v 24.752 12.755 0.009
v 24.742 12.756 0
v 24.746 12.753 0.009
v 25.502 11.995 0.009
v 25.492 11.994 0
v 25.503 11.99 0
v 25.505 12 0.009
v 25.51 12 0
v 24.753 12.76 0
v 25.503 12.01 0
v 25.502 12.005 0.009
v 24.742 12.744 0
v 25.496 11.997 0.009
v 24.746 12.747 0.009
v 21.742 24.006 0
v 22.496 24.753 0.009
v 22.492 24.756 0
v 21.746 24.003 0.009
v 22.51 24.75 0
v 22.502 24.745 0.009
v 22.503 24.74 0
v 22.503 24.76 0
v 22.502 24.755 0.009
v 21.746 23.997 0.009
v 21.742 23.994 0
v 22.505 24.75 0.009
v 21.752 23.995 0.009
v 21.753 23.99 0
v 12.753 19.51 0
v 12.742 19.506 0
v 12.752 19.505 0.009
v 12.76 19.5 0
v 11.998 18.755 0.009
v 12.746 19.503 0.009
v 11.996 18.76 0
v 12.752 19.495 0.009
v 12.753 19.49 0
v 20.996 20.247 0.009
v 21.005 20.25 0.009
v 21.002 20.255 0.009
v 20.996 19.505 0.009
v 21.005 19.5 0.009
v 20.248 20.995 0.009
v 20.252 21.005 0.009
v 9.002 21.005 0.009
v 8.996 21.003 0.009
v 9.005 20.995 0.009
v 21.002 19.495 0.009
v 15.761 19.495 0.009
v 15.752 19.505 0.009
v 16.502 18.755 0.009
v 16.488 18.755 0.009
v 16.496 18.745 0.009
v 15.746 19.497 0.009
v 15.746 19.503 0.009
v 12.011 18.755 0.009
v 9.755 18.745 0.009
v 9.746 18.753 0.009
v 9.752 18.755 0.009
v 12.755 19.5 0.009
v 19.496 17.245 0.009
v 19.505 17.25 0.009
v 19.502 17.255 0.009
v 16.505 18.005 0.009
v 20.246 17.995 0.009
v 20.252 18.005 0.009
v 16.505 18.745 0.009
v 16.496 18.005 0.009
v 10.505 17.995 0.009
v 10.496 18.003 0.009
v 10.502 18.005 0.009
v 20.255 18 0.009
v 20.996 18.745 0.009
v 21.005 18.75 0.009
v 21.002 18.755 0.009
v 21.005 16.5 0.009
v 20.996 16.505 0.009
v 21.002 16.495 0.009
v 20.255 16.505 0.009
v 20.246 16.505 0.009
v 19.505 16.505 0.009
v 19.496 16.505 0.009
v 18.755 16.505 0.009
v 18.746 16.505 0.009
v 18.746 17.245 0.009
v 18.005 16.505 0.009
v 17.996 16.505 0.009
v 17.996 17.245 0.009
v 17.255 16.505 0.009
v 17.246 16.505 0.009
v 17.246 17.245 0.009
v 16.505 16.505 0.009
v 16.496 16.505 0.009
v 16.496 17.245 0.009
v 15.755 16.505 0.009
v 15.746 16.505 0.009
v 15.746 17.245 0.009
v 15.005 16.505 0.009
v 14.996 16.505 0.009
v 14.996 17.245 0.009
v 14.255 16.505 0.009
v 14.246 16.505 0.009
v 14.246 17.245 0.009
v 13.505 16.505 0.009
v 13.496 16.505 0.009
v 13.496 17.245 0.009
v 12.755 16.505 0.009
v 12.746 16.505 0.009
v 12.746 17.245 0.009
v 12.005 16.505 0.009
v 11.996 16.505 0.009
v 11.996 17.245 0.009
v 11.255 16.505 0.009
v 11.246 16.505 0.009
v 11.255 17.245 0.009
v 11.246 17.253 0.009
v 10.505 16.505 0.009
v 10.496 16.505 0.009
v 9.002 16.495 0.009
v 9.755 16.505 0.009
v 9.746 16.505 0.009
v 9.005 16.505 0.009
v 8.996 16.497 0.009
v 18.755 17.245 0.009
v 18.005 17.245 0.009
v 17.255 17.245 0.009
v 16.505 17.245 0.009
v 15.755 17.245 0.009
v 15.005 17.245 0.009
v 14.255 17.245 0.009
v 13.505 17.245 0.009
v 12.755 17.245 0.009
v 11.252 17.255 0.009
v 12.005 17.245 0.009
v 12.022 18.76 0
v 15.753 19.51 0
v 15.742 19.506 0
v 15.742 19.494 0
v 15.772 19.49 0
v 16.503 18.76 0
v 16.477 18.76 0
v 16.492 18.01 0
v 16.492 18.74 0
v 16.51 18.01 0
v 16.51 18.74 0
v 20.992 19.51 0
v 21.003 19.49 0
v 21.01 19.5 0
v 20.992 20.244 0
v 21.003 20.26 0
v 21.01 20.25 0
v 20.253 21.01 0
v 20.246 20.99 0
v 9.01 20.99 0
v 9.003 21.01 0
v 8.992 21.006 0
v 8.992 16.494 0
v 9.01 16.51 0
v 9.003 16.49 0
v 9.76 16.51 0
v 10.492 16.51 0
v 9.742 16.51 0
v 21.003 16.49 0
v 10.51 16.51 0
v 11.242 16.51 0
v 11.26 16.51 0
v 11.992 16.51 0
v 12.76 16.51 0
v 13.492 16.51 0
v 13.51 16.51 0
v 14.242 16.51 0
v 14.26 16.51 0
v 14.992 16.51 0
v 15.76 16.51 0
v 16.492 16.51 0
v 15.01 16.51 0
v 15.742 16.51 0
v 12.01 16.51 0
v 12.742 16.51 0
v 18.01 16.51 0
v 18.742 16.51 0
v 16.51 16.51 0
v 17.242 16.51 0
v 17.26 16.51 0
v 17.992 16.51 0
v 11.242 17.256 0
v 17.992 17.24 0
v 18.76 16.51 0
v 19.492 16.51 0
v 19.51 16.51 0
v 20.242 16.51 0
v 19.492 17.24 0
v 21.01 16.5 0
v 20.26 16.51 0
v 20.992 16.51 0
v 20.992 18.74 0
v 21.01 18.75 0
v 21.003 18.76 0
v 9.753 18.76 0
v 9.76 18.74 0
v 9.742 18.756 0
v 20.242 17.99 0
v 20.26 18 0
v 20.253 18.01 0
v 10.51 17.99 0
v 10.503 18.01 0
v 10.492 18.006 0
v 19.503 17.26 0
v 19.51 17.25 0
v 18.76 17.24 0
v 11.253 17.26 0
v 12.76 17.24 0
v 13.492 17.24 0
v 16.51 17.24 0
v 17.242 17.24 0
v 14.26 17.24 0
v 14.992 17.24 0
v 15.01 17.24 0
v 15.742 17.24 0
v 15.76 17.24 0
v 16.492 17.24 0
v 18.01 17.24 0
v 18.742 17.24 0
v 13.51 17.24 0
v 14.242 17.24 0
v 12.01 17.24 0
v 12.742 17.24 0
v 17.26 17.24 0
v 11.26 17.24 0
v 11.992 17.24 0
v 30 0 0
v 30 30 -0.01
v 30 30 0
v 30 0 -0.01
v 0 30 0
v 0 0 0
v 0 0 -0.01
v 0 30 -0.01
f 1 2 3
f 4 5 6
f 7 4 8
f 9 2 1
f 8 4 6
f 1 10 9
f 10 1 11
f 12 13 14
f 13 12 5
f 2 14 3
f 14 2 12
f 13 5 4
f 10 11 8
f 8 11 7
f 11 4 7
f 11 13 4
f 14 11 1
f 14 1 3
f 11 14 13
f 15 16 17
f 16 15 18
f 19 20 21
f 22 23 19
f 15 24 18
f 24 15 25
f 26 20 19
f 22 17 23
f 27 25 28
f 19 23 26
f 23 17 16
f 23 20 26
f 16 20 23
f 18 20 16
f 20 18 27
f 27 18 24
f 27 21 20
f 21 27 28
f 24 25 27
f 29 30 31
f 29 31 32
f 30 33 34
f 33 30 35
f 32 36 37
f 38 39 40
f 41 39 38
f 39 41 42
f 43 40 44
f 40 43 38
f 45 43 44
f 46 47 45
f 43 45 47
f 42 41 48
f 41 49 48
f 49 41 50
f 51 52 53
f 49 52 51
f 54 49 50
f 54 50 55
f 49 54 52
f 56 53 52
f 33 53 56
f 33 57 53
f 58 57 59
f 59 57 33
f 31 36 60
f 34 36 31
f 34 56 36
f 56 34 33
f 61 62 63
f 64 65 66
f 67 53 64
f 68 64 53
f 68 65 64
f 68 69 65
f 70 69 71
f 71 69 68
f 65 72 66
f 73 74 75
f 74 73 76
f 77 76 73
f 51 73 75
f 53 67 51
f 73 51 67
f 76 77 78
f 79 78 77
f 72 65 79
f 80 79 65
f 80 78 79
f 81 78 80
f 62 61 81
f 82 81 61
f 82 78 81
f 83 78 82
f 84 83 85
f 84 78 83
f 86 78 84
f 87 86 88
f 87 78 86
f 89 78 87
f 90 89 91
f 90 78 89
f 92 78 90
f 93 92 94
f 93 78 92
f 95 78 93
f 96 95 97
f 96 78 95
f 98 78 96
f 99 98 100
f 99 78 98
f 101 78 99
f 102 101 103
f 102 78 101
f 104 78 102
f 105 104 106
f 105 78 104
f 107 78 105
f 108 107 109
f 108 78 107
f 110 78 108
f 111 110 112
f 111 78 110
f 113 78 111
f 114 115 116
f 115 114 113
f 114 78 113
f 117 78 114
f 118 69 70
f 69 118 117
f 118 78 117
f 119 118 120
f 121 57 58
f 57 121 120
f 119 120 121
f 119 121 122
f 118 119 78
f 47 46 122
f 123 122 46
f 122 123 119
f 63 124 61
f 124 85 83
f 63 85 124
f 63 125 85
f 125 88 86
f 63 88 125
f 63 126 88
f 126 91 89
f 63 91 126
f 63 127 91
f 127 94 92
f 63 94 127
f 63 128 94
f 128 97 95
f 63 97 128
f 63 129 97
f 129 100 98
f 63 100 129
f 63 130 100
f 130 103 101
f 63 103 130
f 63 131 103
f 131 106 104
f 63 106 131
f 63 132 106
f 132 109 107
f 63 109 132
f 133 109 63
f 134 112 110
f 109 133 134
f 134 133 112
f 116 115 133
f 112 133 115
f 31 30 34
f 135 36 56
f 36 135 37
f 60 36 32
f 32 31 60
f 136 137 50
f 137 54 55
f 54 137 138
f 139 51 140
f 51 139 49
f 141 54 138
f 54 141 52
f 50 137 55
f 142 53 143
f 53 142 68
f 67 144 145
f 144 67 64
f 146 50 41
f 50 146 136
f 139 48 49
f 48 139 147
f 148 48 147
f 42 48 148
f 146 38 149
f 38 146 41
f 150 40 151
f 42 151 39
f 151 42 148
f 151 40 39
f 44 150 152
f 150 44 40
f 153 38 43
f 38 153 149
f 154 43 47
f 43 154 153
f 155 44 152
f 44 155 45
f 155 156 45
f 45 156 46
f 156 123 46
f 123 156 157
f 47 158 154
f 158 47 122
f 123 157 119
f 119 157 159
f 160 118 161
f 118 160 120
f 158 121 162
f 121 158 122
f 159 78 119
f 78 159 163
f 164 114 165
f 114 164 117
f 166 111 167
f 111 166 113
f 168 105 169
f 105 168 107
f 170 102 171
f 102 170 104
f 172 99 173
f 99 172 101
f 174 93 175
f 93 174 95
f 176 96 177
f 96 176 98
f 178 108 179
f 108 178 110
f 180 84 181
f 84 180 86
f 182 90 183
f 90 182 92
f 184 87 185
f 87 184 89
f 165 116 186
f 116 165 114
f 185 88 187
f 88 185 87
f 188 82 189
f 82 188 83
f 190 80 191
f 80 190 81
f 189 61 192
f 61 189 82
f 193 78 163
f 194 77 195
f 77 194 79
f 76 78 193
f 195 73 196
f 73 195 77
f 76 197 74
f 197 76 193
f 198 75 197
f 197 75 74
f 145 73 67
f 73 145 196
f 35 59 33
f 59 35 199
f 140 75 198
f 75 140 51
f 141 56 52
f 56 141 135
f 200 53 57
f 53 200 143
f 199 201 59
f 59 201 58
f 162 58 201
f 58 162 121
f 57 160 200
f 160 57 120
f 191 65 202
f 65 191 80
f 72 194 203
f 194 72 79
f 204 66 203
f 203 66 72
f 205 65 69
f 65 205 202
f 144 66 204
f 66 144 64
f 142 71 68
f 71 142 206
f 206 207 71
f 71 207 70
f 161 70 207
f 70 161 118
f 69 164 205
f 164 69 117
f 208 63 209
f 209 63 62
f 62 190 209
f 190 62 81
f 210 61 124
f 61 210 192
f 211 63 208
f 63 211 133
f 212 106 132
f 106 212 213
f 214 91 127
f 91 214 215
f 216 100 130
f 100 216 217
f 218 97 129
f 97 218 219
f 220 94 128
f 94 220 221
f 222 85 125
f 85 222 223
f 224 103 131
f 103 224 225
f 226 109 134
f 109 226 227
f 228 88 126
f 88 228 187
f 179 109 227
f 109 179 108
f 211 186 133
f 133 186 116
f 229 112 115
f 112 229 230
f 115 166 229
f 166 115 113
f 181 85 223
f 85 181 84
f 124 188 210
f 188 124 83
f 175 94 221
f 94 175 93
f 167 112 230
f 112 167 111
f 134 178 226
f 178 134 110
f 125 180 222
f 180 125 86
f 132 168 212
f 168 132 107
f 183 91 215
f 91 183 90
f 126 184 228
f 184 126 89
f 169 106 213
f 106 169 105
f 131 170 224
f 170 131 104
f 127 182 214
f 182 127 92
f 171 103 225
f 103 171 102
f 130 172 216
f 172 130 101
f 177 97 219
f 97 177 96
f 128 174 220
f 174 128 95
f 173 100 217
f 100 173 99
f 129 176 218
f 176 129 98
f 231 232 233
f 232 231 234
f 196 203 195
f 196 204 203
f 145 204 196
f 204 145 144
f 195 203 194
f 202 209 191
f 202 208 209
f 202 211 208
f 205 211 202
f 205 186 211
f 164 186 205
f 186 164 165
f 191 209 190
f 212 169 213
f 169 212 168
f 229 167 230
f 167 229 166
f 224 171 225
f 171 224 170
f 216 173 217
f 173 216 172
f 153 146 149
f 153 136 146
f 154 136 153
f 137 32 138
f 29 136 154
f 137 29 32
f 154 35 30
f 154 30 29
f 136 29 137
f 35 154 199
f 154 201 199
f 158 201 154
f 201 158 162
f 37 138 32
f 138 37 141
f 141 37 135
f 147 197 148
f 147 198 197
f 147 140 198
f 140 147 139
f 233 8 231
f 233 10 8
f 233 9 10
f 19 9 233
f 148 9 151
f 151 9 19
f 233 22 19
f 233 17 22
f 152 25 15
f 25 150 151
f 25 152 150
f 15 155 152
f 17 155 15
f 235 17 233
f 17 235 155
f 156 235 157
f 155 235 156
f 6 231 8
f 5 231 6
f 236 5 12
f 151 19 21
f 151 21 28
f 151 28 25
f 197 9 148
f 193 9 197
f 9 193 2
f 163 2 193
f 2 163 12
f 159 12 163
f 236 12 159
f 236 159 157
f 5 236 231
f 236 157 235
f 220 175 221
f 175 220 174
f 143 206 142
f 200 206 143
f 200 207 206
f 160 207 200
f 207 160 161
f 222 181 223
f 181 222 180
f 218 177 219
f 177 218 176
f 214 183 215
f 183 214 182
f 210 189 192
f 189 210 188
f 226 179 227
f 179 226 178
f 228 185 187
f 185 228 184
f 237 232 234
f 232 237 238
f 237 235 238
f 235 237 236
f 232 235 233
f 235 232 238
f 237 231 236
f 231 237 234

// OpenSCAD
hull(){
    translate([25.5, 12]) sphere(0.01);
    translate([24.75, 12.75]) sphere(0.01);
}
hull(){
    translate([21.75, 24]) sphere(0.01);
    translate([22.5, 24.75]) sphere(0.01);
}
hull(){
    translate([12.75, 19.5]) sphere(0.01);
    translate([12, 18.75]) sphere(0.01);
}
hull(){
    translate([15.75, 19.5]) sphere(0.01);
    translate([16.5, 18.75]) sphere(0.01);
}
hull(){
    translate([16.5, 18.75]) sphere(0.01);
    translate([16.5, 18]) sphere(0.01);
}
hull(){
    translate([15.75, 19.5]) sphere(0.01);
    translate([16.5, 19.5]) sphere(0.01);
}
hull(){
    translate([16.5, 19.5]) sphere(0.01);
    translate([17.25, 19.5]) sphere(0.01);
}
hull(){
    translate([17.25, 19.5]) sphere(0.01);
    translate([18, 19.5]) sphere(0.01);
}
hull(){
    translate([18, 19.5]) sphere(0.01);
    translate([18.75, 19.5]) sphere(0.01);
}
hull(){
    translate([18.75, 19.5]) sphere(0.01);
    translate([19.5, 19.5]) sphere(0.01);
}
hull(){
    translate([19.5, 19.5]) sphere(0.01);
    translate([20.25, 19.5]) sphere(0.01);
}
hull(){
    translate([20.25, 19.5]) sphere(0.01);
    translate([21, 19.5]) sphere(0.01);
}
hull(){
    translate([21, 19.5]) sphere(0.01);
    translate([21, 20.25]) sphere(0.01);
}
hull(){
    translate([21, 20.25]) sphere(0.01);
    translate([20.25, 21]) sphere(0.01);
}
hull(){
    translate([20.25, 21]) sphere(0.01);
    translate([19.5, 21]) sphere(0.01);
}
hull(){
    translate([19.5, 21]) sphere(0.01);
    translate([18.75, 21]) sphere(0.01);
}
hull(){
    translate([18.75, 21]) sphere(0.01);
    translate([18, 21]) sphere(0.01);
}
hull(){
    translate([18, 21]) sphere(0.01);
    translate([17.25, 21]) sphere(0.01);
}
hull(){
    translate([17.25, 21]) sphere(0.01);
    translate([16.5, 21]) sphere(0.01);
}
hull(){
    translate([16.5, 21]) sphere(0.01);
    translate([15.75, 21]) sphere(0.01);
}
hull(){
    translate([15.75, 21]) sphere(0.01);
    translate([15, 21]) sphere(0.01);
}
hull(){
    translate([15, 21]) sphere(0.01);
    translate([14.25, 21]) sphere(0.01);
}
hull(){
    translate([14.25, 21]) sphere(0.01);
    translate([13.5, 21]) sphere(0.01);
}
hull(){
    translate([13.5, 21]) sphere(0.01);
    translate([12.75, 21]) sphere(0.01);
}
hull(){
    translate([12.75, 21]) sphere(0.01);
    translate([12, 21]) sphere(0.01);
}
hull(){
    translate([12, 21]) sphere(0.01);
    translate([11.25, 21]) sphere(0.01);
}
hull(){
    translate([11.25, 21]) sphere(0.01);
    translate([10.5, 21]) sphere(0.01);
}
hull(){
    translate([10.5, 21]) sphere(0.01);
    translate([9.75, 21]) sphere(0.01);
}
hull(){
    translate([9.75, 21]) sphere(0.01);
    translate([9, 21]) sphere(0.01);
}
hull(){
    translate([9, 21]) sphere(0.01);
    translate([9, 20.25]) sphere(0.01);
}
hull(){
    translate([9, 20.25]) sphere(0.01);
    translate([9, 19.5]) sphere(0.01);
}
hull(){
    translate([9, 19.5]) sphere(0.01);
    translate([9, 18.75]) sphere(0.01);
}
hull(){
    translate([9, 18.75]) sphere(0.01);
    translate([9, 18]) sphere(0.01);
}
hull(){
    translate([9, 18]) sphere(0.01);
    translate([9, 17.25]) sphere(0.01);
}
hull(){
    translate([9, 17.25]) sphere(0.01);
    translate([9, 16.5]) sphere(0.01);
}
hull(){
    translate([9, 16.5]) sphere(0.01);
    translate([9.75, 16.5]) sphere(0.01);
}
hull(){
    translate([9.75, 16.5]) sphere(0.01);
    translate([10.5, 16.5]) sphere(0.01);
}
hull(){
    translate([10.5, 16.5]) sphere(0.01);
    translate([11.25, 16.5]) sphere(0.01);
}
hull(){
    translate([11.25, 16.5]) sphere(0.01);
    translate([12, 16.5]) sphere(0.01);
}
hull(){
    translate([12, 16.5]) sphere(0.01);
    translate([12.75, 16.5]) sphere(0.01);
}
hull(){
    translate([12.75, 16.5]) sphere(0.01);
    translate([13.5, 16.5]) sphere(0.01);
}
hull(){
    translate([13.5, 16.5]) sphere(0.01);
    translate([14.25, 16.5]) sphere(0.01);
}
hull(){
    translate([14.25, 16.5]) sphere(0.01);
    translate([15, 16.5]) sphere(0.01);
}
hull(){
    translate([15, 16.5]) sphere(0.01);
    translate([15.75, 16.5]) sphere(0.01);
}
hull(){
    translate([15.75, 16.5]) sphere(0.01);
    translate([16.5, 16.5]) sphere(0.01);
}
hull(){
    translate([16.5, 16.5]) sphere(0.01);
    translate([17.25, 16.5]) sphere(0.01);
}
hull(){
    translate([17.25, 16.5]) sphere(0.01);
    translate([18, 16.5]) sphere(0.01);
}
hull(){
    translate([18, 16.5]) sphere(0.01);
    translate([18.75, 16.5]) sphere(0.01);
}
hull(){
    translate([18.75, 16.5]) sphere(0.01);
    translate([19.5, 16.5]) sphere(0.01);
}
hull(){
    translate([19.5, 16.5]) sphere(0.01);
    translate([20.25, 16.5]) sphere(0.01);
}
hull(){
    translate([20.25, 16.5]) sphere(0.01);
    translate([21, 16.5]) sphere(0.01);
}
hull(){
    translate([21, 16.5]) sphere(0.01);
    translate([21, 17.25]) sphere(0.01);
}
hull(){
    translate([21, 17.25]) sphere(0.01);
    translate([21, 18]) sphere(0.01);
}
hull(){
    translate([21, 18]) sphere(0.01);
    translate([21, 18.75]) sphere(0.01);
}
hull(){
    translate([21, 18.75]) sphere(0.01);
    translate([20.25, 18.75]) sphere(0.01);
}
hull(){
    translate([20.25, 18.75]) sphere(0.01);
    translate([19.5, 18.75]) sphere(0.01);
}
hull(){
    translate([19.5, 18.75]) sphere(0.01);
    translate([18.75, 18.75]) sphere(0.01);
}
hull(){
    translate([18.75, 18.75]) sphere(0.01);
    translate([18, 18.75]) sphere(0.01);
}
hull(){
    translate([18, 18.75]) sphere(0.01);
    translate([17.25, 18.75]) sphere(0.01);
}
hull(){
    translate([17.25, 18.75]) sphere(0.01);
    translate([16.5, 18.75]) sphere(0.01);
}
hull(){
    translate([16.5, 18.75]) sphere(0.01);
    translate([15.75, 18.75]) sphere(0.01);
}
hull(){
    translate([15.75, 18.75]) sphere(0.01);
    translate([15, 18.75]) sphere(0.01);
}
hull(){
    translate([15, 18.75]) sphere(0.01);
    translate([14.25, 18.75]) sphere(0.01);
}
hull(){
    translate([14.25, 18.75]) sphere(0.01);
    translate([13.5, 18.75]) sphere(0.01);
}
hull(){
    translate([13.5, 18.75]) sphere(0.01);
    translate([12.75, 18.75]) sphere(0.01);
}
hull(){
    translate([12.75, 18.75]) sphere(0.01);
    translate([12, 18.75]) sphere(0.01);
}
hull(){
    translate([12, 18.75]) sphere(0.01);
    translate([11.25, 18.75]) sphere(0.01);
}
hull(){
    translate([11.25, 18.75]) sphere(0.01);
    translate([10.5, 18.75]) sphere(0.01);
}
hull(){
    translate([10.5, 18.75]) sphere(0.01);
    translate([9.75, 18.75]) sphere(0.01);
}
hull(){
    translate([9.75, 18.75]) sphere(0.01);
    translate([9.75, 18]) sphere(0.01);
}
hull(){
    translate([9.75, 18]) sphere(0.01);
    translate([9.75, 17.25]) sphere(0.01);
}
hull(){
    translate([9.75, 17.25]) sphere(0.01);
    translate([9.75, 16.5]) sphere(0.01);
}
hull(){
    translate([9.75, 16.5]) sphere(0.01);
    translate([10.5, 16.5]) sphere(0.01);
}
hull(){
    translate([10.5, 16.5]) sphere(0.01);
    translate([11.25, 16.5]) sphere(0.01);
}
hull(){
    translate([11.25, 16.5]) sphere(0.01);
    translate([12, 16.5]) sphere(0.01);
}
hull(){
    translate([12, 16.5]) sphere(0.01);
    translate([12.75, 16.5]) sphere(0.01);
}
hull(){
    translate([12.75, 16.5]) sphere(0.01);
    translate([13.5, 16.5]) sphere(0.01);
}
hull(){
    translate([13.5, 16.5]) sphere(0.01);
    translate([14.25, 16.5]) sphere(0.01);
}
hull(){
    translate([14.25, 16.5]) sphere(0.01);
    translate([15, 16.5]) sphere(0.01);
}
hull(){
    translate([15, 16.5]) sphere(0.01);
    translate([15.75, 16.5]) sphere(0.01);
}
hull(){
    translate([15.75, 16.5]) sphere(0.01);
    translate([16.5, 16.5]) sphere(0.01);
}
hull(){
    translate([16.5, 16.5]) sphere(0.01);
    translate([17.25, 16.5]) sphere(0.01);
}
hull(){
    translate([17.25, 16.5]) sphere(0.01);
    translate([18, 16.5]) sphere(0.01);
}
hull(){
    translate([18, 16.5]) sphere(0.01);
    translate([18.75, 16.5]) sphere(0.01);
}
hull(){
    translate([18.75, 16.5]) sphere(0.01);
    translate([19.5, 16.5]) sphere(0.01);
}
hull(){
    translate([19.5, 16.5]) sphere(0.01);
    translate([20.25, 16.5]) sphere(0.01);
}
hull(){
    translate([20.25, 16.5]) sphere(0.01);
    translate([20.25, 17.25]) sphere(0.01);
}
hull(){
    translate([20.25, 17.25]) sphere(0.01);
    translate([20.25, 18]) sphere(0.01);
}
hull(){
    translate([20.25, 18]) sphere(0.01);
    translate([19.5, 18]) sphere(0.01);
}
hull(){
    translate([19.5, 18]) sphere(0.01);
    translate([18.75, 18]) sphere(0.01);
}
hull(){
    translate([18.75, 18]) sphere(0.01);
    translate([18, 18]) sphere(0.01);
}
hull(){
    translate([18, 18]) sphere(0.01);
    translate([17.25, 18]) sphere(0.01);
}
hull(){
    translate([17.25, 18]) sphere(0.01);
    translate([16.5, 18]) sphere(0.01);
}
hull(){
    translate([16.5, 18]) sphere(0.01);
    translate([15.75, 18]) sphere(0.01);
}
hull(){
    translate([15.75, 18]) sphere(0.01);
    translate([15, 18]) sphere(0.01);
}
hull(){
    translate([15, 18]) sphere(0.01);
    translate([14.25, 18]) sphere(0.01);
}
hull(){
    translate([14.25, 18]) sphere(0.01);
    translate([13.5, 18]) sphere(0.01);
}
hull(){
    translate([13.5, 18]) sphere(0.01);
    translate([12.75, 18]) sphere(0.01);
}
hull(){
    translate([12.75, 18]) sphere(0.01);
    translate([12, 18]) sphere(0.01);
}
hull(){
    translate([12, 18]) sphere(0.01);
    translate([11.25, 18]) sphere(0.01);
}
hull(){
    translate([11.25, 18]) sphere(0.01);
    translate([10.5, 18]) sphere(0.01);
}
hull(){
    translate([10.5, 18]) sphere(0.01);
    translate([10.5, 17.25]) sphere(0.01);
}
hull(){
    translate([10.5, 17.25]) sphere(0.01);
    translate([10.5, 16.5]) sphere(0.01);
}
hull(){
    translate([10.5, 16.5]) sphere(0.01);
    translate([11.25, 16.5]) sphere(0.01);
}
hull(){
    translate([11.25, 16.5]) sphere(0.01);
    translate([12, 16.5]) sphere(0.01);
}
hull(){
    translate([12, 16.5]) sphere(0.01);
    translate([12.75, 16.5]) sphere(0.01);
}
hull(){
    translate([12.75, 16.5]) sphere(0.01);
    translate([13.5, 16.5]) sphere(0.01);
}
hull(){
    translate([13.5, 16.5]) sphere(0.01);
    translate([14.25, 16.5]) sphere(0.01);
}
hull(){
    translate([14.25, 16.5]) sphere(0.01);
    translate([15, 16.5]) sphere(0.01);
}
hull(){
    translate([15, 16.5]) sphere(0.01);
    translate([15.75, 16.5]) sphere(0.01);
}
hull(){
    translate([15.75, 16.5]) sphere(0.01);
    translate([16.5, 16.5]) sphere(0.01);
}
hull(){
    translate([16.5, 16.5]) sphere(0.01);
    translate([17.25, 16.5]) sphere(0.01);
}
hull(){
    translate([17.25, 16.5]) sphere(0.01);
    translate([18, 16.5]) sphere(0.01);
}
hull(){
    translate([18, 16.5]) sphere(0.01);
    translate([18.75, 16.5]) sphere(0.01);
}
hull(){
    translate([18.75, 16.5]) sphere(0.01);
    translate([19.5, 16.5]) sphere(0.01);
}
hull(){
    translate([19.5, 16.5]) sphere(0.01);
    translate([19.5, 17.25]) sphere(0.01);
}
hull(){
    translate([19.5, 17.25]) sphere(0.01);
    translate([18.75, 17.25]) sphere(0.01);
}
hull(){
    translate([18.75, 17.25]) sphere(0.01);
    translate([18, 17.25]) sphere(0.01);
}
hull(){
    translate([18, 17.25]) sphere(0.01);
    translate([17.25, 17.25]) sphere(0.01);
}
hull(){
    translate([17.25, 17.25]) sphere(0.01);
    translate([16.5, 17.25]) sphere(0.01);
}
hull(){
    translate([16.5, 17.25]) sphere(0.01);
    translate([15.75, 17.25]) sphere(0.01);
}
hull(){
    translate([15.75, 17.25]) sphere(0.01);
    translate([15, 17.25]) sphere(0.01);
}
hull(){
    translate([15, 17.25]) sphere(0.01);
    translate([14.25, 17.25]) sphere(0.01);
}
hull(){
    translate([14.25, 17.25]) sphere(0.01);
    translate([13.5, 17.25]) sphere(0.01);
}
hull(){
    translate([13.5, 17.25]) sphere(0.01);
    translate([12.75, 17.25]) sphere(0.01);
}
hull(){
    translate([12.75, 17.25]) sphere(0.01);
    translate([12, 17.25]) sphere(0.01);
}
hull(){
    translate([12, 17.25]) sphere(0.01);
    translate([11.25, 17.25]) sphere(0.01);
}
hull(){
    translate([11.25, 17.25]) sphere(0.01);
    translate([11.25, 16.5]) sphere(0.01);
}
hull(){
    translate([11.25, 16.5]) sphere(0.01);
    translate([12, 16.5]) sphere(0.01);
}
hull(){
    translate([12, 16.5]) sphere(0.01);
    translate([12.75, 16.5]) sphere(0.01);
}
hull(){
    translate([12.75, 16.5]) sphere(0.01);
    translate([13.5, 16.5]) sphere(0.01);
}
hull(){
    translate([13.5, 16.5]) sphere(0.01);
    translate([14.25, 16.5]) sphere(0.01);
}
hull(){
    translate([14.25, 16.5]) sphere(0.01);
    translate([15, 16.5]) sphere(0.01);
}
hull(){
    translate([15, 16.5]) sphere(0.01);
    translate([15.75, 16.5]) sphere(0.01);
}
hull(){
    translate([15.75, 16.5]) sphere(0.01);
    translate([16.5, 16.5]) sphere(0.01);
}
hull(){
    translate([16.5, 16.5]) sphere(0.01);
    translate([17.25, 16.5]) sphere(0.01);
}
hull(){
    translate([17.25, 16.5]) sphere(0.01);
    translate([18, 16.5]) sphere(0.01);
}
hull(){
    translate([18, 16.5]) sphere(0.01);
    translate([18.75, 16.5]) sphere(0.01);
}
hull(){
    translate([18.75, 16.5]) sphere(0.01);
    translate([18.75, 17.25]) sphere(0.01);
}
hull(){
    translate([18.75, 17.25]) sphere(0.01);
    translate([18, 17.25]) sphere(0.01);
}
hull(){
    translate([18, 17.25]) sphere(0.01);
    translate([17.25, 17.25]) sphere(0.01);
}
hull(){
    translate([17.25, 17.25]) sphere(0.01);
    translate([16.5, 17.25]) sphere(0.01);
}
hull(){
    translate([16.5, 17.25]) sphere(0.01);
    translate([15.75, 17.25]) sphere(0.01);
}
hull(){
    translate([15.75, 17.25]) sphere(0.01);
    translate([15, 17.25]) sphere(0.01);
}
hull(){
    translate([15, 17.25]) sphere(0.01);
    translate([14.25, 17.25]) sphere(0.01);
}
hull(){
    translate([14.25, 17.25]) sphere(0.01);
    translate([13.5, 17.25]) sphere(0.01);
}
hull(){
    translate([13.5, 17.25]) sphere(0.01);
    translate([12.75, 17.25]) sphere(0.01);
}
hull(){
    translate([12.75, 17.25]) sphere(0.01);
    translate([12, 17.25]) sphere(0.01);
}
hull(){
    translate([12, 17.25]) sphere(0.01);
    translate([12, 16.5]) sphere(0.01);
}
hull(){
    translate([12, 16.5]) sphere(0.01);
    translate([12.75, 16.5]) sphere(0.01);
}
hull(){
    translate([12.75, 16.5]) sphere(0.01);
    translate([13.5, 16.5]) sphere(0.01);
}
hull(){
    translate([13.5, 16.5]) sphere(0.01);
    translate([14.25, 16.5]) sphere(0.01);
}
hull(){
    translate([14.25, 16.5]) sphere(0.01);
    translate([15, 16.5]) sphere(0.01);
}
hull(){
    translate([15, 16.5]) sphere(0.01);
    translate([15.75, 16.5]) sphere(0.01);
}
hull(){
    translate([15.75, 16.5]) sphere(0.01);
    translate([16.5, 16.5]) sphere(0.01);
}
hull(){
    translate([16.5, 16.5]) sphere(0.01);
    translate([17.25, 16.5]) sphere(0.01);
}
hull(){
    translate([17.25, 16.5]) sphere(0.01);
    translate([18, 16.5]) sphere(0.01);
}
hull(){
    translate([18, 16.5]) sphere(0.01);
    translate([18, 17.25]) sphere(0.01);
}
hull(){
    translate([18, 17.25]) sphere(0.01);
    translate([17.25, 17.25]) sphere(0.01);
}
hull(){
    translate([17.25, 17.25]) sphere(0.01);
    translate([16.5, 17.25]) sphere(0.01);
}
hull(){
    translate([16.5, 17.25]) sphere(0.01);
    translate([15.75, 17.25]) sphere(0.01);
}
hull(){
    translate([15.75, 17.25]) sphere(0.01);
    translate([15, 17.25]) sphere(0.01);
}
hull(){
    translate([15, 17.25]) sphere(0.01);
    translate([14.25, 17.25]) sphere(0.01);
}
hull(){
    translate([14.25, 17.25]) sphere(0.01);
    translate([13.5, 17.25]) sphere(0.01);
}
hull(){
    translate([13.5, 17.25]) sphere(0.01);
    translate([12.75, 17.25]) sphere(0.01);
}
hull(){
    translate([12.75, 17.25]) sphere(0.01);
    translate([12.75, 16.5]) sphere(0.01);
}
hull(){
    translate([12.75, 16.5]) sphere(0.01);
    translate([13.5, 16.5]) sphere(0.01);
}
hull(){
    translate([13.5, 16.5]) sphere(0.01);
    translate([14.25, 16.5]) sphere(0.01);
}
hull(){
    translate([14.25, 16.5]) sphere(0.01);
    translate([15, 16.5]) sphere(0.01);
}
hull(){
    translate([15, 16.5]) sphere(0.01);
    translate([15.75, 16.5]) sphere(0.01);
}
hull(){
    translate([15.75, 16.5]) sphere(0.01);
    translate([16.5, 16.5]) sphere(0.01);
}
hull(){
    translate([16.5, 16.5]) sphere(0.01);
    translate([17.25, 16.5]) sphere(0.01);
}
hull(){
    translate([17.25, 16.5]) sphere(0.01);
    translate([17.25, 17.25]) sphere(0.01);
}
hull(){
    translate([17.25, 17.25]) sphere(0.01);
    translate([16.5, 17.25]) sphere(0.01);
}
hull(){
    translate([16.5, 17.25]) sphere(0.01);
    translate([15.75, 17.25]) sphere(0.01);
}
hull(){
    translate([15.75, 17.25]) sphere(0.01);
    translate([15, 17.25]) sphere(0.01);
}
hull(){
    translate([15, 17.25]) sphere(0.01);
    translate([14.25, 17.25]) sphere(0.01);
}
hull(){
    translate([14.25, 17.25]) sphere(0.01);
    translate([13.5, 17.25]) sphere(0.01);
}
hull(){
    translate([13.5, 17.25]) sphere(0.01);
    translate([13.5, 16.5]) sphere(0.01);
}
hull(){
    translate([13.5, 16.5]) sphere(0.01);
    translate([14.25, 16.5]) sphere(0.01);
}
hull(){
    translate([14.25, 16.5]) sphere(0.01);
    translate([15, 16.5]) sphere(0.01);
}
hull(){
    translate([15, 16.5]) sphere(0.01);
    translate([15.75, 16.5]) sphere(0.01);
}
hull(){
    translate([15.75, 16.5]) sphere(0.01);
    translate([16.5, 16.5]) sphere(0.01);
}
hull(){
    translate([16.5, 16.5]) sphere(0.01);
    translate([16.5, 17.25]) sphere(0.01);
}
hull(){
    translate([16.5, 17.25]) sphere(0.01);
    translate([15.75, 17.25]) sphere(0.01);
}
hull(){
    translate([15.75, 17.25]) sphere(0.01);
    translate([15, 17.25]) sphere(0.01);
}
hull(){
    translate([15, 17.25]) sphere(0.01);
    translate([14.25, 17.25]) sphere(0.01);
}
hull(){
    translate([14.25, 17.25]) sphere(0.01);
    translate([14.25, 16.5]) sphere(0.01);
}
hull(){
    translate([14.25, 16.5]) sphere(0.01);
    translate([15, 16.5]) sphere(0.01);
}
hull(){
    translate([15, 16.5]) sphere(0.01);
    translate([15.75, 16.5]) sphere(0.01);
}
hull(){
    translate([15.75, 16.5]) sphere(0.01);
    translate([15.75, 17.25]) sphere(0.01);
}
hull(){
    translate([15.75, 17.25]) sphere(0.01);
    translate([15, 17.25]) sphere(0.01);
}
hull(){
    translate([15, 17.25]) sphere(0.01);
    translate([15, 16.5]) sphere(0.01);
}
translate([0,0,-0.01]) color([0.1,0.1,0.1]) cube([30,30,0.01]);
